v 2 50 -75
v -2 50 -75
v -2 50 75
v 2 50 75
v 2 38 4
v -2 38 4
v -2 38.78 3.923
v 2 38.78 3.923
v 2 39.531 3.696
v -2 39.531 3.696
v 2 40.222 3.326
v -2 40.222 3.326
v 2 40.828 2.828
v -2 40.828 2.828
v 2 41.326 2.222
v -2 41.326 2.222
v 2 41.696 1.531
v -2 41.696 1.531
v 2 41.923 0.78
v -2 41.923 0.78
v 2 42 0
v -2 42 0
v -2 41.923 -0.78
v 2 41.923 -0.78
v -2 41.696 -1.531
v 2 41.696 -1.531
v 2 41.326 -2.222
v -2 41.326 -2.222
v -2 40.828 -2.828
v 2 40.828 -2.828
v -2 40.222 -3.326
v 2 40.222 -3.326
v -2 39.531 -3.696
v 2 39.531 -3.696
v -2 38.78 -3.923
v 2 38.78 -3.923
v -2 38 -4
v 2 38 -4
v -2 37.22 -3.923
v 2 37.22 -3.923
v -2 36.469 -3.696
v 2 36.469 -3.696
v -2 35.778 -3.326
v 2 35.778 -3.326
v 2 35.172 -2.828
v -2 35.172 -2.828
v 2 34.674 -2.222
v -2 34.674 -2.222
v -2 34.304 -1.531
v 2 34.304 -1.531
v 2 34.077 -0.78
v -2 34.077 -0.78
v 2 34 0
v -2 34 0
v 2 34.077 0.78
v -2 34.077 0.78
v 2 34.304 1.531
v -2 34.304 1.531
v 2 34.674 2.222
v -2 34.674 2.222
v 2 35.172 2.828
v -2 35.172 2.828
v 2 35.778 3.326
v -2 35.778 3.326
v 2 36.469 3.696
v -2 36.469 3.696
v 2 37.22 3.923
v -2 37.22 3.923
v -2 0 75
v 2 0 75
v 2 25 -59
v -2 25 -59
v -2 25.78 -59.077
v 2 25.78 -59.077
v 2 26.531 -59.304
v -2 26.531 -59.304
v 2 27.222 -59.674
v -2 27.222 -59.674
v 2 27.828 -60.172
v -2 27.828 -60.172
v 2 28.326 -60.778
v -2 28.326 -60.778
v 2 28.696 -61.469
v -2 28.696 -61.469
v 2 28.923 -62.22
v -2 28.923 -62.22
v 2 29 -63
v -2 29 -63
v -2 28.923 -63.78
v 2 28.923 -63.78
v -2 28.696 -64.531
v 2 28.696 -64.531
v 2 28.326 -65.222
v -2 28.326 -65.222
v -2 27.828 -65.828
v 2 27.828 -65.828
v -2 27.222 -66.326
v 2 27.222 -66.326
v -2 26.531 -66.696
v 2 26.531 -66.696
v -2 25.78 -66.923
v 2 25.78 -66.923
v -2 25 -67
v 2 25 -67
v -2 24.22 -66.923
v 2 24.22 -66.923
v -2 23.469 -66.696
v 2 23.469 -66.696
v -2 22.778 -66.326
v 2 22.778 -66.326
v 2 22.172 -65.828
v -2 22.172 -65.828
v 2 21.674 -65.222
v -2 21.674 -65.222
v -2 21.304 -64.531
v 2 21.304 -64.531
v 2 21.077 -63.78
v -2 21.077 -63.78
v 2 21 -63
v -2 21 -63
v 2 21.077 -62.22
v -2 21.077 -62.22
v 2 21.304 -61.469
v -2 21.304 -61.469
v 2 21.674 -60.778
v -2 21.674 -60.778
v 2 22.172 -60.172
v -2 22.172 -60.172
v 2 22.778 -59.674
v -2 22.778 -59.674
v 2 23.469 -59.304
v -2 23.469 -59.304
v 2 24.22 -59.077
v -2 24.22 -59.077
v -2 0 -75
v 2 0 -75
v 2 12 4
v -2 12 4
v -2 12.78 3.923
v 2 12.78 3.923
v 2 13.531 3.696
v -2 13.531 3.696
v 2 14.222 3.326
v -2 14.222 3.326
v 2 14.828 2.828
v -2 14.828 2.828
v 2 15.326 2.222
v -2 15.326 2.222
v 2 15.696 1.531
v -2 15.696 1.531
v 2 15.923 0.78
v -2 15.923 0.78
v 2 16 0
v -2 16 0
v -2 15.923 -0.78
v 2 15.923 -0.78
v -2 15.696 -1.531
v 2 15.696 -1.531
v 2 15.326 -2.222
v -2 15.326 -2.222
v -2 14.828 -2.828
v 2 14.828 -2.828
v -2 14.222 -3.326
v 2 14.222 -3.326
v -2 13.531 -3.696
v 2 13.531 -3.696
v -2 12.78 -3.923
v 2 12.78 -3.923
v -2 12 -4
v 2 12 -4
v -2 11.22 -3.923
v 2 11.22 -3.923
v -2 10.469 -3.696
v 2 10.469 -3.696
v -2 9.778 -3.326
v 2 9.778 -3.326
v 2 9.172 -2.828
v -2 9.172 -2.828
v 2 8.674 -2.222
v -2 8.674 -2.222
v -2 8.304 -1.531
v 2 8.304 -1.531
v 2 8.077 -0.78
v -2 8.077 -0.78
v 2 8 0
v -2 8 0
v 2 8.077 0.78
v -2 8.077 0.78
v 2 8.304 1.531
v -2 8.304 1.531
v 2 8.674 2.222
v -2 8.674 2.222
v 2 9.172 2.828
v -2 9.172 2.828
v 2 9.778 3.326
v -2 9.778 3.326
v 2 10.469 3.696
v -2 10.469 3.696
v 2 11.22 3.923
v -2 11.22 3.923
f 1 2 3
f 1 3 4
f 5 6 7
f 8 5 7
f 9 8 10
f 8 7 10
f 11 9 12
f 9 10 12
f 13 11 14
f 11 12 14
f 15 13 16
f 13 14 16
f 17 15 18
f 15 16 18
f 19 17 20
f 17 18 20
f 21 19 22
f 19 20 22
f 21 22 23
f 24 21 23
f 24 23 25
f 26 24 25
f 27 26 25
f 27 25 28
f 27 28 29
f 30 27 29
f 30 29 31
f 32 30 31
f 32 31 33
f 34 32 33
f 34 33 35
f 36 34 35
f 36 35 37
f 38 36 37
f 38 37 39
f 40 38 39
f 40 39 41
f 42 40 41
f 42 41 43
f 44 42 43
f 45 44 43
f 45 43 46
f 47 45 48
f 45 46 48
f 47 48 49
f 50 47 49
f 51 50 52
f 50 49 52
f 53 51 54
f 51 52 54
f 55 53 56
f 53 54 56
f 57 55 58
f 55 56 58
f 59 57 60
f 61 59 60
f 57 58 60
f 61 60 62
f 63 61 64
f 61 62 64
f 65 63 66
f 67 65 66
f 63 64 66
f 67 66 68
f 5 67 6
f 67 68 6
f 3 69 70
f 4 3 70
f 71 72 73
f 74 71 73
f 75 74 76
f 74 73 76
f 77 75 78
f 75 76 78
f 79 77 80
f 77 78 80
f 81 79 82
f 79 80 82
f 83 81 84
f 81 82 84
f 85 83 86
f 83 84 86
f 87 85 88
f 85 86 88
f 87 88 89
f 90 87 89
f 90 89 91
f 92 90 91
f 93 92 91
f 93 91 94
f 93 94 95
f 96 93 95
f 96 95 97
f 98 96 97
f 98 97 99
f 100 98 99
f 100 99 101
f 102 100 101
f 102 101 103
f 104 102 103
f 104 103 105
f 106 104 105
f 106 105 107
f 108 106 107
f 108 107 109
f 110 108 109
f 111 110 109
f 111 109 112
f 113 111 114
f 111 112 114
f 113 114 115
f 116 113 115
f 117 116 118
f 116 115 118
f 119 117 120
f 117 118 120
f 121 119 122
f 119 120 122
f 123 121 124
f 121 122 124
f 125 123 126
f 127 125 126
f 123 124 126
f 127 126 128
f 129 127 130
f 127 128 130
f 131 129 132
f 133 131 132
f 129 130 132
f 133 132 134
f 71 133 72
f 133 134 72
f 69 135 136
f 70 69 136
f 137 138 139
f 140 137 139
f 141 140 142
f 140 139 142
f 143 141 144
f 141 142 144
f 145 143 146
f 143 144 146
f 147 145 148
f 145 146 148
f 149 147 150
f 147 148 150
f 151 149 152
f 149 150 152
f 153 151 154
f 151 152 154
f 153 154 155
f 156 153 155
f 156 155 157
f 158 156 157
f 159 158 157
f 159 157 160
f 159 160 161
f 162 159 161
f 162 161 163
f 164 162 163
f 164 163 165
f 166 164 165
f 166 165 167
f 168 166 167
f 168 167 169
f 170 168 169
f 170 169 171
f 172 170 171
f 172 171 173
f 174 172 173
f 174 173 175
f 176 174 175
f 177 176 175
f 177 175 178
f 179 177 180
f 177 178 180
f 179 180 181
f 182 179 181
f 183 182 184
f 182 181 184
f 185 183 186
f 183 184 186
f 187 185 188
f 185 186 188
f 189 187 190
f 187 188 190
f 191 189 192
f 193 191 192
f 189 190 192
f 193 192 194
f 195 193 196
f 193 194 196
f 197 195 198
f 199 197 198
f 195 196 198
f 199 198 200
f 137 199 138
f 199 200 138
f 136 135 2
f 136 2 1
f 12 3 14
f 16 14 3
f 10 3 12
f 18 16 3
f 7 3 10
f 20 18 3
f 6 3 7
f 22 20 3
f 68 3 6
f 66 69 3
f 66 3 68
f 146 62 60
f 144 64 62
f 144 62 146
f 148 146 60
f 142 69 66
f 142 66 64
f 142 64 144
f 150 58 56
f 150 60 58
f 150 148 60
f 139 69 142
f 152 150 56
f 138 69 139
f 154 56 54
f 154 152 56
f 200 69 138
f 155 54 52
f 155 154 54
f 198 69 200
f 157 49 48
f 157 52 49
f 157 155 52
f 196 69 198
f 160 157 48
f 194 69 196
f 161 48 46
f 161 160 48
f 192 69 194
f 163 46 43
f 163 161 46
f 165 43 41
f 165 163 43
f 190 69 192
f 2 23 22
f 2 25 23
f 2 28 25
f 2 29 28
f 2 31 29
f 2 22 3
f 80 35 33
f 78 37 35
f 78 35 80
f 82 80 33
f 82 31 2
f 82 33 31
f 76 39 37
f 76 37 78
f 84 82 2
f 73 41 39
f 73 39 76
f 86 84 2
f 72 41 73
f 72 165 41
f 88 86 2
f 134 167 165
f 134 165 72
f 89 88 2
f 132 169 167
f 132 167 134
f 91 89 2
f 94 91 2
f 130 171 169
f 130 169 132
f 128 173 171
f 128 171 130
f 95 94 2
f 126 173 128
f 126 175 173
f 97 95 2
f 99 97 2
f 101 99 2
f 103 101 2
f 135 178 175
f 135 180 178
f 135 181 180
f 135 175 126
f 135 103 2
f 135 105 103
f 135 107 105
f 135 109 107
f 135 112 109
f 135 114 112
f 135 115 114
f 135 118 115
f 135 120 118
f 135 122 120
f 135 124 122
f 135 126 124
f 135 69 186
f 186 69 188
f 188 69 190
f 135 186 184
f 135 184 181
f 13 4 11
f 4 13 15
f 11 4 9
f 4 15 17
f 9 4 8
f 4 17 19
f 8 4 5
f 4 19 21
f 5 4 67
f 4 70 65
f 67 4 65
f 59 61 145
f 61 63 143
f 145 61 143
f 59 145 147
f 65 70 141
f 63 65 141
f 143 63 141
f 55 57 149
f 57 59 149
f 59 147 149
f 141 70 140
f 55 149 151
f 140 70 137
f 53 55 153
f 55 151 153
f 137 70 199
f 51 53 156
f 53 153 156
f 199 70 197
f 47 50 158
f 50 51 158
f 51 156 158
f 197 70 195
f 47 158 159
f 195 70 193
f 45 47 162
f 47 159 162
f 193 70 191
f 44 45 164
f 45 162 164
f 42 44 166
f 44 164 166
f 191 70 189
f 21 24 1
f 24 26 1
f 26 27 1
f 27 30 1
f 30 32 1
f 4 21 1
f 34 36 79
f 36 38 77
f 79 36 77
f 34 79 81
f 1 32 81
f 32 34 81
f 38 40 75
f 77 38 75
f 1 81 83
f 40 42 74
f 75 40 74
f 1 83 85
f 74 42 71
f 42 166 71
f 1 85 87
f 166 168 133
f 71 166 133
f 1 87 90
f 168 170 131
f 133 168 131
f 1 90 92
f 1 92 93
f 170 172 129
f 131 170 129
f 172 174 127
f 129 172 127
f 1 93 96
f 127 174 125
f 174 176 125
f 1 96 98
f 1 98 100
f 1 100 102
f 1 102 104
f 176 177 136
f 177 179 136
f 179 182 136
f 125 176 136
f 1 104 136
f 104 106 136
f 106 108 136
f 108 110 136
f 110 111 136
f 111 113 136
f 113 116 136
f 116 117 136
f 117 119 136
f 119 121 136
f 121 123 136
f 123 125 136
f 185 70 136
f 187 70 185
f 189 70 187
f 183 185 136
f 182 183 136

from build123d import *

# Parameters (mm, degrees)
SKETCH1_W           = 4
SKETCH1_H           = 150
BOSS_EXTRUDE1_DEPTH = 50
SKETCH2_R           = 4
CUT_EXTRUDE1_DEPTH  = 10


with BuildPart() as part:
    # Sketch1 → Boss-Extrude1 (new body)
    with BuildSketch(Plane(origin=(0, 0, 0), x_dir=(1, 0, 0), z_dir=(0, 1, 0))):
        Rectangle(SKETCH1_W, SKETCH1_H)
    extrude(amount=BOSS_EXTRUDE1_DEPTH)

    # Sketch2 → Cut-Extrude1 (cut)
    with BuildSketch(Plane.ZY.offset(2)):
        with Locations((0, 38)):
            Circle(SKETCH2_R)
        with Locations((0, 12)):
            Circle(SKETCH2_R)
        with Locations((-63, 25)):
            Circle(SKETCH2_R)
    extrude(amount=-CUT_EXTRUDE1_DEPTH, mode=Mode.SUBTRACT)


solid = part.part
